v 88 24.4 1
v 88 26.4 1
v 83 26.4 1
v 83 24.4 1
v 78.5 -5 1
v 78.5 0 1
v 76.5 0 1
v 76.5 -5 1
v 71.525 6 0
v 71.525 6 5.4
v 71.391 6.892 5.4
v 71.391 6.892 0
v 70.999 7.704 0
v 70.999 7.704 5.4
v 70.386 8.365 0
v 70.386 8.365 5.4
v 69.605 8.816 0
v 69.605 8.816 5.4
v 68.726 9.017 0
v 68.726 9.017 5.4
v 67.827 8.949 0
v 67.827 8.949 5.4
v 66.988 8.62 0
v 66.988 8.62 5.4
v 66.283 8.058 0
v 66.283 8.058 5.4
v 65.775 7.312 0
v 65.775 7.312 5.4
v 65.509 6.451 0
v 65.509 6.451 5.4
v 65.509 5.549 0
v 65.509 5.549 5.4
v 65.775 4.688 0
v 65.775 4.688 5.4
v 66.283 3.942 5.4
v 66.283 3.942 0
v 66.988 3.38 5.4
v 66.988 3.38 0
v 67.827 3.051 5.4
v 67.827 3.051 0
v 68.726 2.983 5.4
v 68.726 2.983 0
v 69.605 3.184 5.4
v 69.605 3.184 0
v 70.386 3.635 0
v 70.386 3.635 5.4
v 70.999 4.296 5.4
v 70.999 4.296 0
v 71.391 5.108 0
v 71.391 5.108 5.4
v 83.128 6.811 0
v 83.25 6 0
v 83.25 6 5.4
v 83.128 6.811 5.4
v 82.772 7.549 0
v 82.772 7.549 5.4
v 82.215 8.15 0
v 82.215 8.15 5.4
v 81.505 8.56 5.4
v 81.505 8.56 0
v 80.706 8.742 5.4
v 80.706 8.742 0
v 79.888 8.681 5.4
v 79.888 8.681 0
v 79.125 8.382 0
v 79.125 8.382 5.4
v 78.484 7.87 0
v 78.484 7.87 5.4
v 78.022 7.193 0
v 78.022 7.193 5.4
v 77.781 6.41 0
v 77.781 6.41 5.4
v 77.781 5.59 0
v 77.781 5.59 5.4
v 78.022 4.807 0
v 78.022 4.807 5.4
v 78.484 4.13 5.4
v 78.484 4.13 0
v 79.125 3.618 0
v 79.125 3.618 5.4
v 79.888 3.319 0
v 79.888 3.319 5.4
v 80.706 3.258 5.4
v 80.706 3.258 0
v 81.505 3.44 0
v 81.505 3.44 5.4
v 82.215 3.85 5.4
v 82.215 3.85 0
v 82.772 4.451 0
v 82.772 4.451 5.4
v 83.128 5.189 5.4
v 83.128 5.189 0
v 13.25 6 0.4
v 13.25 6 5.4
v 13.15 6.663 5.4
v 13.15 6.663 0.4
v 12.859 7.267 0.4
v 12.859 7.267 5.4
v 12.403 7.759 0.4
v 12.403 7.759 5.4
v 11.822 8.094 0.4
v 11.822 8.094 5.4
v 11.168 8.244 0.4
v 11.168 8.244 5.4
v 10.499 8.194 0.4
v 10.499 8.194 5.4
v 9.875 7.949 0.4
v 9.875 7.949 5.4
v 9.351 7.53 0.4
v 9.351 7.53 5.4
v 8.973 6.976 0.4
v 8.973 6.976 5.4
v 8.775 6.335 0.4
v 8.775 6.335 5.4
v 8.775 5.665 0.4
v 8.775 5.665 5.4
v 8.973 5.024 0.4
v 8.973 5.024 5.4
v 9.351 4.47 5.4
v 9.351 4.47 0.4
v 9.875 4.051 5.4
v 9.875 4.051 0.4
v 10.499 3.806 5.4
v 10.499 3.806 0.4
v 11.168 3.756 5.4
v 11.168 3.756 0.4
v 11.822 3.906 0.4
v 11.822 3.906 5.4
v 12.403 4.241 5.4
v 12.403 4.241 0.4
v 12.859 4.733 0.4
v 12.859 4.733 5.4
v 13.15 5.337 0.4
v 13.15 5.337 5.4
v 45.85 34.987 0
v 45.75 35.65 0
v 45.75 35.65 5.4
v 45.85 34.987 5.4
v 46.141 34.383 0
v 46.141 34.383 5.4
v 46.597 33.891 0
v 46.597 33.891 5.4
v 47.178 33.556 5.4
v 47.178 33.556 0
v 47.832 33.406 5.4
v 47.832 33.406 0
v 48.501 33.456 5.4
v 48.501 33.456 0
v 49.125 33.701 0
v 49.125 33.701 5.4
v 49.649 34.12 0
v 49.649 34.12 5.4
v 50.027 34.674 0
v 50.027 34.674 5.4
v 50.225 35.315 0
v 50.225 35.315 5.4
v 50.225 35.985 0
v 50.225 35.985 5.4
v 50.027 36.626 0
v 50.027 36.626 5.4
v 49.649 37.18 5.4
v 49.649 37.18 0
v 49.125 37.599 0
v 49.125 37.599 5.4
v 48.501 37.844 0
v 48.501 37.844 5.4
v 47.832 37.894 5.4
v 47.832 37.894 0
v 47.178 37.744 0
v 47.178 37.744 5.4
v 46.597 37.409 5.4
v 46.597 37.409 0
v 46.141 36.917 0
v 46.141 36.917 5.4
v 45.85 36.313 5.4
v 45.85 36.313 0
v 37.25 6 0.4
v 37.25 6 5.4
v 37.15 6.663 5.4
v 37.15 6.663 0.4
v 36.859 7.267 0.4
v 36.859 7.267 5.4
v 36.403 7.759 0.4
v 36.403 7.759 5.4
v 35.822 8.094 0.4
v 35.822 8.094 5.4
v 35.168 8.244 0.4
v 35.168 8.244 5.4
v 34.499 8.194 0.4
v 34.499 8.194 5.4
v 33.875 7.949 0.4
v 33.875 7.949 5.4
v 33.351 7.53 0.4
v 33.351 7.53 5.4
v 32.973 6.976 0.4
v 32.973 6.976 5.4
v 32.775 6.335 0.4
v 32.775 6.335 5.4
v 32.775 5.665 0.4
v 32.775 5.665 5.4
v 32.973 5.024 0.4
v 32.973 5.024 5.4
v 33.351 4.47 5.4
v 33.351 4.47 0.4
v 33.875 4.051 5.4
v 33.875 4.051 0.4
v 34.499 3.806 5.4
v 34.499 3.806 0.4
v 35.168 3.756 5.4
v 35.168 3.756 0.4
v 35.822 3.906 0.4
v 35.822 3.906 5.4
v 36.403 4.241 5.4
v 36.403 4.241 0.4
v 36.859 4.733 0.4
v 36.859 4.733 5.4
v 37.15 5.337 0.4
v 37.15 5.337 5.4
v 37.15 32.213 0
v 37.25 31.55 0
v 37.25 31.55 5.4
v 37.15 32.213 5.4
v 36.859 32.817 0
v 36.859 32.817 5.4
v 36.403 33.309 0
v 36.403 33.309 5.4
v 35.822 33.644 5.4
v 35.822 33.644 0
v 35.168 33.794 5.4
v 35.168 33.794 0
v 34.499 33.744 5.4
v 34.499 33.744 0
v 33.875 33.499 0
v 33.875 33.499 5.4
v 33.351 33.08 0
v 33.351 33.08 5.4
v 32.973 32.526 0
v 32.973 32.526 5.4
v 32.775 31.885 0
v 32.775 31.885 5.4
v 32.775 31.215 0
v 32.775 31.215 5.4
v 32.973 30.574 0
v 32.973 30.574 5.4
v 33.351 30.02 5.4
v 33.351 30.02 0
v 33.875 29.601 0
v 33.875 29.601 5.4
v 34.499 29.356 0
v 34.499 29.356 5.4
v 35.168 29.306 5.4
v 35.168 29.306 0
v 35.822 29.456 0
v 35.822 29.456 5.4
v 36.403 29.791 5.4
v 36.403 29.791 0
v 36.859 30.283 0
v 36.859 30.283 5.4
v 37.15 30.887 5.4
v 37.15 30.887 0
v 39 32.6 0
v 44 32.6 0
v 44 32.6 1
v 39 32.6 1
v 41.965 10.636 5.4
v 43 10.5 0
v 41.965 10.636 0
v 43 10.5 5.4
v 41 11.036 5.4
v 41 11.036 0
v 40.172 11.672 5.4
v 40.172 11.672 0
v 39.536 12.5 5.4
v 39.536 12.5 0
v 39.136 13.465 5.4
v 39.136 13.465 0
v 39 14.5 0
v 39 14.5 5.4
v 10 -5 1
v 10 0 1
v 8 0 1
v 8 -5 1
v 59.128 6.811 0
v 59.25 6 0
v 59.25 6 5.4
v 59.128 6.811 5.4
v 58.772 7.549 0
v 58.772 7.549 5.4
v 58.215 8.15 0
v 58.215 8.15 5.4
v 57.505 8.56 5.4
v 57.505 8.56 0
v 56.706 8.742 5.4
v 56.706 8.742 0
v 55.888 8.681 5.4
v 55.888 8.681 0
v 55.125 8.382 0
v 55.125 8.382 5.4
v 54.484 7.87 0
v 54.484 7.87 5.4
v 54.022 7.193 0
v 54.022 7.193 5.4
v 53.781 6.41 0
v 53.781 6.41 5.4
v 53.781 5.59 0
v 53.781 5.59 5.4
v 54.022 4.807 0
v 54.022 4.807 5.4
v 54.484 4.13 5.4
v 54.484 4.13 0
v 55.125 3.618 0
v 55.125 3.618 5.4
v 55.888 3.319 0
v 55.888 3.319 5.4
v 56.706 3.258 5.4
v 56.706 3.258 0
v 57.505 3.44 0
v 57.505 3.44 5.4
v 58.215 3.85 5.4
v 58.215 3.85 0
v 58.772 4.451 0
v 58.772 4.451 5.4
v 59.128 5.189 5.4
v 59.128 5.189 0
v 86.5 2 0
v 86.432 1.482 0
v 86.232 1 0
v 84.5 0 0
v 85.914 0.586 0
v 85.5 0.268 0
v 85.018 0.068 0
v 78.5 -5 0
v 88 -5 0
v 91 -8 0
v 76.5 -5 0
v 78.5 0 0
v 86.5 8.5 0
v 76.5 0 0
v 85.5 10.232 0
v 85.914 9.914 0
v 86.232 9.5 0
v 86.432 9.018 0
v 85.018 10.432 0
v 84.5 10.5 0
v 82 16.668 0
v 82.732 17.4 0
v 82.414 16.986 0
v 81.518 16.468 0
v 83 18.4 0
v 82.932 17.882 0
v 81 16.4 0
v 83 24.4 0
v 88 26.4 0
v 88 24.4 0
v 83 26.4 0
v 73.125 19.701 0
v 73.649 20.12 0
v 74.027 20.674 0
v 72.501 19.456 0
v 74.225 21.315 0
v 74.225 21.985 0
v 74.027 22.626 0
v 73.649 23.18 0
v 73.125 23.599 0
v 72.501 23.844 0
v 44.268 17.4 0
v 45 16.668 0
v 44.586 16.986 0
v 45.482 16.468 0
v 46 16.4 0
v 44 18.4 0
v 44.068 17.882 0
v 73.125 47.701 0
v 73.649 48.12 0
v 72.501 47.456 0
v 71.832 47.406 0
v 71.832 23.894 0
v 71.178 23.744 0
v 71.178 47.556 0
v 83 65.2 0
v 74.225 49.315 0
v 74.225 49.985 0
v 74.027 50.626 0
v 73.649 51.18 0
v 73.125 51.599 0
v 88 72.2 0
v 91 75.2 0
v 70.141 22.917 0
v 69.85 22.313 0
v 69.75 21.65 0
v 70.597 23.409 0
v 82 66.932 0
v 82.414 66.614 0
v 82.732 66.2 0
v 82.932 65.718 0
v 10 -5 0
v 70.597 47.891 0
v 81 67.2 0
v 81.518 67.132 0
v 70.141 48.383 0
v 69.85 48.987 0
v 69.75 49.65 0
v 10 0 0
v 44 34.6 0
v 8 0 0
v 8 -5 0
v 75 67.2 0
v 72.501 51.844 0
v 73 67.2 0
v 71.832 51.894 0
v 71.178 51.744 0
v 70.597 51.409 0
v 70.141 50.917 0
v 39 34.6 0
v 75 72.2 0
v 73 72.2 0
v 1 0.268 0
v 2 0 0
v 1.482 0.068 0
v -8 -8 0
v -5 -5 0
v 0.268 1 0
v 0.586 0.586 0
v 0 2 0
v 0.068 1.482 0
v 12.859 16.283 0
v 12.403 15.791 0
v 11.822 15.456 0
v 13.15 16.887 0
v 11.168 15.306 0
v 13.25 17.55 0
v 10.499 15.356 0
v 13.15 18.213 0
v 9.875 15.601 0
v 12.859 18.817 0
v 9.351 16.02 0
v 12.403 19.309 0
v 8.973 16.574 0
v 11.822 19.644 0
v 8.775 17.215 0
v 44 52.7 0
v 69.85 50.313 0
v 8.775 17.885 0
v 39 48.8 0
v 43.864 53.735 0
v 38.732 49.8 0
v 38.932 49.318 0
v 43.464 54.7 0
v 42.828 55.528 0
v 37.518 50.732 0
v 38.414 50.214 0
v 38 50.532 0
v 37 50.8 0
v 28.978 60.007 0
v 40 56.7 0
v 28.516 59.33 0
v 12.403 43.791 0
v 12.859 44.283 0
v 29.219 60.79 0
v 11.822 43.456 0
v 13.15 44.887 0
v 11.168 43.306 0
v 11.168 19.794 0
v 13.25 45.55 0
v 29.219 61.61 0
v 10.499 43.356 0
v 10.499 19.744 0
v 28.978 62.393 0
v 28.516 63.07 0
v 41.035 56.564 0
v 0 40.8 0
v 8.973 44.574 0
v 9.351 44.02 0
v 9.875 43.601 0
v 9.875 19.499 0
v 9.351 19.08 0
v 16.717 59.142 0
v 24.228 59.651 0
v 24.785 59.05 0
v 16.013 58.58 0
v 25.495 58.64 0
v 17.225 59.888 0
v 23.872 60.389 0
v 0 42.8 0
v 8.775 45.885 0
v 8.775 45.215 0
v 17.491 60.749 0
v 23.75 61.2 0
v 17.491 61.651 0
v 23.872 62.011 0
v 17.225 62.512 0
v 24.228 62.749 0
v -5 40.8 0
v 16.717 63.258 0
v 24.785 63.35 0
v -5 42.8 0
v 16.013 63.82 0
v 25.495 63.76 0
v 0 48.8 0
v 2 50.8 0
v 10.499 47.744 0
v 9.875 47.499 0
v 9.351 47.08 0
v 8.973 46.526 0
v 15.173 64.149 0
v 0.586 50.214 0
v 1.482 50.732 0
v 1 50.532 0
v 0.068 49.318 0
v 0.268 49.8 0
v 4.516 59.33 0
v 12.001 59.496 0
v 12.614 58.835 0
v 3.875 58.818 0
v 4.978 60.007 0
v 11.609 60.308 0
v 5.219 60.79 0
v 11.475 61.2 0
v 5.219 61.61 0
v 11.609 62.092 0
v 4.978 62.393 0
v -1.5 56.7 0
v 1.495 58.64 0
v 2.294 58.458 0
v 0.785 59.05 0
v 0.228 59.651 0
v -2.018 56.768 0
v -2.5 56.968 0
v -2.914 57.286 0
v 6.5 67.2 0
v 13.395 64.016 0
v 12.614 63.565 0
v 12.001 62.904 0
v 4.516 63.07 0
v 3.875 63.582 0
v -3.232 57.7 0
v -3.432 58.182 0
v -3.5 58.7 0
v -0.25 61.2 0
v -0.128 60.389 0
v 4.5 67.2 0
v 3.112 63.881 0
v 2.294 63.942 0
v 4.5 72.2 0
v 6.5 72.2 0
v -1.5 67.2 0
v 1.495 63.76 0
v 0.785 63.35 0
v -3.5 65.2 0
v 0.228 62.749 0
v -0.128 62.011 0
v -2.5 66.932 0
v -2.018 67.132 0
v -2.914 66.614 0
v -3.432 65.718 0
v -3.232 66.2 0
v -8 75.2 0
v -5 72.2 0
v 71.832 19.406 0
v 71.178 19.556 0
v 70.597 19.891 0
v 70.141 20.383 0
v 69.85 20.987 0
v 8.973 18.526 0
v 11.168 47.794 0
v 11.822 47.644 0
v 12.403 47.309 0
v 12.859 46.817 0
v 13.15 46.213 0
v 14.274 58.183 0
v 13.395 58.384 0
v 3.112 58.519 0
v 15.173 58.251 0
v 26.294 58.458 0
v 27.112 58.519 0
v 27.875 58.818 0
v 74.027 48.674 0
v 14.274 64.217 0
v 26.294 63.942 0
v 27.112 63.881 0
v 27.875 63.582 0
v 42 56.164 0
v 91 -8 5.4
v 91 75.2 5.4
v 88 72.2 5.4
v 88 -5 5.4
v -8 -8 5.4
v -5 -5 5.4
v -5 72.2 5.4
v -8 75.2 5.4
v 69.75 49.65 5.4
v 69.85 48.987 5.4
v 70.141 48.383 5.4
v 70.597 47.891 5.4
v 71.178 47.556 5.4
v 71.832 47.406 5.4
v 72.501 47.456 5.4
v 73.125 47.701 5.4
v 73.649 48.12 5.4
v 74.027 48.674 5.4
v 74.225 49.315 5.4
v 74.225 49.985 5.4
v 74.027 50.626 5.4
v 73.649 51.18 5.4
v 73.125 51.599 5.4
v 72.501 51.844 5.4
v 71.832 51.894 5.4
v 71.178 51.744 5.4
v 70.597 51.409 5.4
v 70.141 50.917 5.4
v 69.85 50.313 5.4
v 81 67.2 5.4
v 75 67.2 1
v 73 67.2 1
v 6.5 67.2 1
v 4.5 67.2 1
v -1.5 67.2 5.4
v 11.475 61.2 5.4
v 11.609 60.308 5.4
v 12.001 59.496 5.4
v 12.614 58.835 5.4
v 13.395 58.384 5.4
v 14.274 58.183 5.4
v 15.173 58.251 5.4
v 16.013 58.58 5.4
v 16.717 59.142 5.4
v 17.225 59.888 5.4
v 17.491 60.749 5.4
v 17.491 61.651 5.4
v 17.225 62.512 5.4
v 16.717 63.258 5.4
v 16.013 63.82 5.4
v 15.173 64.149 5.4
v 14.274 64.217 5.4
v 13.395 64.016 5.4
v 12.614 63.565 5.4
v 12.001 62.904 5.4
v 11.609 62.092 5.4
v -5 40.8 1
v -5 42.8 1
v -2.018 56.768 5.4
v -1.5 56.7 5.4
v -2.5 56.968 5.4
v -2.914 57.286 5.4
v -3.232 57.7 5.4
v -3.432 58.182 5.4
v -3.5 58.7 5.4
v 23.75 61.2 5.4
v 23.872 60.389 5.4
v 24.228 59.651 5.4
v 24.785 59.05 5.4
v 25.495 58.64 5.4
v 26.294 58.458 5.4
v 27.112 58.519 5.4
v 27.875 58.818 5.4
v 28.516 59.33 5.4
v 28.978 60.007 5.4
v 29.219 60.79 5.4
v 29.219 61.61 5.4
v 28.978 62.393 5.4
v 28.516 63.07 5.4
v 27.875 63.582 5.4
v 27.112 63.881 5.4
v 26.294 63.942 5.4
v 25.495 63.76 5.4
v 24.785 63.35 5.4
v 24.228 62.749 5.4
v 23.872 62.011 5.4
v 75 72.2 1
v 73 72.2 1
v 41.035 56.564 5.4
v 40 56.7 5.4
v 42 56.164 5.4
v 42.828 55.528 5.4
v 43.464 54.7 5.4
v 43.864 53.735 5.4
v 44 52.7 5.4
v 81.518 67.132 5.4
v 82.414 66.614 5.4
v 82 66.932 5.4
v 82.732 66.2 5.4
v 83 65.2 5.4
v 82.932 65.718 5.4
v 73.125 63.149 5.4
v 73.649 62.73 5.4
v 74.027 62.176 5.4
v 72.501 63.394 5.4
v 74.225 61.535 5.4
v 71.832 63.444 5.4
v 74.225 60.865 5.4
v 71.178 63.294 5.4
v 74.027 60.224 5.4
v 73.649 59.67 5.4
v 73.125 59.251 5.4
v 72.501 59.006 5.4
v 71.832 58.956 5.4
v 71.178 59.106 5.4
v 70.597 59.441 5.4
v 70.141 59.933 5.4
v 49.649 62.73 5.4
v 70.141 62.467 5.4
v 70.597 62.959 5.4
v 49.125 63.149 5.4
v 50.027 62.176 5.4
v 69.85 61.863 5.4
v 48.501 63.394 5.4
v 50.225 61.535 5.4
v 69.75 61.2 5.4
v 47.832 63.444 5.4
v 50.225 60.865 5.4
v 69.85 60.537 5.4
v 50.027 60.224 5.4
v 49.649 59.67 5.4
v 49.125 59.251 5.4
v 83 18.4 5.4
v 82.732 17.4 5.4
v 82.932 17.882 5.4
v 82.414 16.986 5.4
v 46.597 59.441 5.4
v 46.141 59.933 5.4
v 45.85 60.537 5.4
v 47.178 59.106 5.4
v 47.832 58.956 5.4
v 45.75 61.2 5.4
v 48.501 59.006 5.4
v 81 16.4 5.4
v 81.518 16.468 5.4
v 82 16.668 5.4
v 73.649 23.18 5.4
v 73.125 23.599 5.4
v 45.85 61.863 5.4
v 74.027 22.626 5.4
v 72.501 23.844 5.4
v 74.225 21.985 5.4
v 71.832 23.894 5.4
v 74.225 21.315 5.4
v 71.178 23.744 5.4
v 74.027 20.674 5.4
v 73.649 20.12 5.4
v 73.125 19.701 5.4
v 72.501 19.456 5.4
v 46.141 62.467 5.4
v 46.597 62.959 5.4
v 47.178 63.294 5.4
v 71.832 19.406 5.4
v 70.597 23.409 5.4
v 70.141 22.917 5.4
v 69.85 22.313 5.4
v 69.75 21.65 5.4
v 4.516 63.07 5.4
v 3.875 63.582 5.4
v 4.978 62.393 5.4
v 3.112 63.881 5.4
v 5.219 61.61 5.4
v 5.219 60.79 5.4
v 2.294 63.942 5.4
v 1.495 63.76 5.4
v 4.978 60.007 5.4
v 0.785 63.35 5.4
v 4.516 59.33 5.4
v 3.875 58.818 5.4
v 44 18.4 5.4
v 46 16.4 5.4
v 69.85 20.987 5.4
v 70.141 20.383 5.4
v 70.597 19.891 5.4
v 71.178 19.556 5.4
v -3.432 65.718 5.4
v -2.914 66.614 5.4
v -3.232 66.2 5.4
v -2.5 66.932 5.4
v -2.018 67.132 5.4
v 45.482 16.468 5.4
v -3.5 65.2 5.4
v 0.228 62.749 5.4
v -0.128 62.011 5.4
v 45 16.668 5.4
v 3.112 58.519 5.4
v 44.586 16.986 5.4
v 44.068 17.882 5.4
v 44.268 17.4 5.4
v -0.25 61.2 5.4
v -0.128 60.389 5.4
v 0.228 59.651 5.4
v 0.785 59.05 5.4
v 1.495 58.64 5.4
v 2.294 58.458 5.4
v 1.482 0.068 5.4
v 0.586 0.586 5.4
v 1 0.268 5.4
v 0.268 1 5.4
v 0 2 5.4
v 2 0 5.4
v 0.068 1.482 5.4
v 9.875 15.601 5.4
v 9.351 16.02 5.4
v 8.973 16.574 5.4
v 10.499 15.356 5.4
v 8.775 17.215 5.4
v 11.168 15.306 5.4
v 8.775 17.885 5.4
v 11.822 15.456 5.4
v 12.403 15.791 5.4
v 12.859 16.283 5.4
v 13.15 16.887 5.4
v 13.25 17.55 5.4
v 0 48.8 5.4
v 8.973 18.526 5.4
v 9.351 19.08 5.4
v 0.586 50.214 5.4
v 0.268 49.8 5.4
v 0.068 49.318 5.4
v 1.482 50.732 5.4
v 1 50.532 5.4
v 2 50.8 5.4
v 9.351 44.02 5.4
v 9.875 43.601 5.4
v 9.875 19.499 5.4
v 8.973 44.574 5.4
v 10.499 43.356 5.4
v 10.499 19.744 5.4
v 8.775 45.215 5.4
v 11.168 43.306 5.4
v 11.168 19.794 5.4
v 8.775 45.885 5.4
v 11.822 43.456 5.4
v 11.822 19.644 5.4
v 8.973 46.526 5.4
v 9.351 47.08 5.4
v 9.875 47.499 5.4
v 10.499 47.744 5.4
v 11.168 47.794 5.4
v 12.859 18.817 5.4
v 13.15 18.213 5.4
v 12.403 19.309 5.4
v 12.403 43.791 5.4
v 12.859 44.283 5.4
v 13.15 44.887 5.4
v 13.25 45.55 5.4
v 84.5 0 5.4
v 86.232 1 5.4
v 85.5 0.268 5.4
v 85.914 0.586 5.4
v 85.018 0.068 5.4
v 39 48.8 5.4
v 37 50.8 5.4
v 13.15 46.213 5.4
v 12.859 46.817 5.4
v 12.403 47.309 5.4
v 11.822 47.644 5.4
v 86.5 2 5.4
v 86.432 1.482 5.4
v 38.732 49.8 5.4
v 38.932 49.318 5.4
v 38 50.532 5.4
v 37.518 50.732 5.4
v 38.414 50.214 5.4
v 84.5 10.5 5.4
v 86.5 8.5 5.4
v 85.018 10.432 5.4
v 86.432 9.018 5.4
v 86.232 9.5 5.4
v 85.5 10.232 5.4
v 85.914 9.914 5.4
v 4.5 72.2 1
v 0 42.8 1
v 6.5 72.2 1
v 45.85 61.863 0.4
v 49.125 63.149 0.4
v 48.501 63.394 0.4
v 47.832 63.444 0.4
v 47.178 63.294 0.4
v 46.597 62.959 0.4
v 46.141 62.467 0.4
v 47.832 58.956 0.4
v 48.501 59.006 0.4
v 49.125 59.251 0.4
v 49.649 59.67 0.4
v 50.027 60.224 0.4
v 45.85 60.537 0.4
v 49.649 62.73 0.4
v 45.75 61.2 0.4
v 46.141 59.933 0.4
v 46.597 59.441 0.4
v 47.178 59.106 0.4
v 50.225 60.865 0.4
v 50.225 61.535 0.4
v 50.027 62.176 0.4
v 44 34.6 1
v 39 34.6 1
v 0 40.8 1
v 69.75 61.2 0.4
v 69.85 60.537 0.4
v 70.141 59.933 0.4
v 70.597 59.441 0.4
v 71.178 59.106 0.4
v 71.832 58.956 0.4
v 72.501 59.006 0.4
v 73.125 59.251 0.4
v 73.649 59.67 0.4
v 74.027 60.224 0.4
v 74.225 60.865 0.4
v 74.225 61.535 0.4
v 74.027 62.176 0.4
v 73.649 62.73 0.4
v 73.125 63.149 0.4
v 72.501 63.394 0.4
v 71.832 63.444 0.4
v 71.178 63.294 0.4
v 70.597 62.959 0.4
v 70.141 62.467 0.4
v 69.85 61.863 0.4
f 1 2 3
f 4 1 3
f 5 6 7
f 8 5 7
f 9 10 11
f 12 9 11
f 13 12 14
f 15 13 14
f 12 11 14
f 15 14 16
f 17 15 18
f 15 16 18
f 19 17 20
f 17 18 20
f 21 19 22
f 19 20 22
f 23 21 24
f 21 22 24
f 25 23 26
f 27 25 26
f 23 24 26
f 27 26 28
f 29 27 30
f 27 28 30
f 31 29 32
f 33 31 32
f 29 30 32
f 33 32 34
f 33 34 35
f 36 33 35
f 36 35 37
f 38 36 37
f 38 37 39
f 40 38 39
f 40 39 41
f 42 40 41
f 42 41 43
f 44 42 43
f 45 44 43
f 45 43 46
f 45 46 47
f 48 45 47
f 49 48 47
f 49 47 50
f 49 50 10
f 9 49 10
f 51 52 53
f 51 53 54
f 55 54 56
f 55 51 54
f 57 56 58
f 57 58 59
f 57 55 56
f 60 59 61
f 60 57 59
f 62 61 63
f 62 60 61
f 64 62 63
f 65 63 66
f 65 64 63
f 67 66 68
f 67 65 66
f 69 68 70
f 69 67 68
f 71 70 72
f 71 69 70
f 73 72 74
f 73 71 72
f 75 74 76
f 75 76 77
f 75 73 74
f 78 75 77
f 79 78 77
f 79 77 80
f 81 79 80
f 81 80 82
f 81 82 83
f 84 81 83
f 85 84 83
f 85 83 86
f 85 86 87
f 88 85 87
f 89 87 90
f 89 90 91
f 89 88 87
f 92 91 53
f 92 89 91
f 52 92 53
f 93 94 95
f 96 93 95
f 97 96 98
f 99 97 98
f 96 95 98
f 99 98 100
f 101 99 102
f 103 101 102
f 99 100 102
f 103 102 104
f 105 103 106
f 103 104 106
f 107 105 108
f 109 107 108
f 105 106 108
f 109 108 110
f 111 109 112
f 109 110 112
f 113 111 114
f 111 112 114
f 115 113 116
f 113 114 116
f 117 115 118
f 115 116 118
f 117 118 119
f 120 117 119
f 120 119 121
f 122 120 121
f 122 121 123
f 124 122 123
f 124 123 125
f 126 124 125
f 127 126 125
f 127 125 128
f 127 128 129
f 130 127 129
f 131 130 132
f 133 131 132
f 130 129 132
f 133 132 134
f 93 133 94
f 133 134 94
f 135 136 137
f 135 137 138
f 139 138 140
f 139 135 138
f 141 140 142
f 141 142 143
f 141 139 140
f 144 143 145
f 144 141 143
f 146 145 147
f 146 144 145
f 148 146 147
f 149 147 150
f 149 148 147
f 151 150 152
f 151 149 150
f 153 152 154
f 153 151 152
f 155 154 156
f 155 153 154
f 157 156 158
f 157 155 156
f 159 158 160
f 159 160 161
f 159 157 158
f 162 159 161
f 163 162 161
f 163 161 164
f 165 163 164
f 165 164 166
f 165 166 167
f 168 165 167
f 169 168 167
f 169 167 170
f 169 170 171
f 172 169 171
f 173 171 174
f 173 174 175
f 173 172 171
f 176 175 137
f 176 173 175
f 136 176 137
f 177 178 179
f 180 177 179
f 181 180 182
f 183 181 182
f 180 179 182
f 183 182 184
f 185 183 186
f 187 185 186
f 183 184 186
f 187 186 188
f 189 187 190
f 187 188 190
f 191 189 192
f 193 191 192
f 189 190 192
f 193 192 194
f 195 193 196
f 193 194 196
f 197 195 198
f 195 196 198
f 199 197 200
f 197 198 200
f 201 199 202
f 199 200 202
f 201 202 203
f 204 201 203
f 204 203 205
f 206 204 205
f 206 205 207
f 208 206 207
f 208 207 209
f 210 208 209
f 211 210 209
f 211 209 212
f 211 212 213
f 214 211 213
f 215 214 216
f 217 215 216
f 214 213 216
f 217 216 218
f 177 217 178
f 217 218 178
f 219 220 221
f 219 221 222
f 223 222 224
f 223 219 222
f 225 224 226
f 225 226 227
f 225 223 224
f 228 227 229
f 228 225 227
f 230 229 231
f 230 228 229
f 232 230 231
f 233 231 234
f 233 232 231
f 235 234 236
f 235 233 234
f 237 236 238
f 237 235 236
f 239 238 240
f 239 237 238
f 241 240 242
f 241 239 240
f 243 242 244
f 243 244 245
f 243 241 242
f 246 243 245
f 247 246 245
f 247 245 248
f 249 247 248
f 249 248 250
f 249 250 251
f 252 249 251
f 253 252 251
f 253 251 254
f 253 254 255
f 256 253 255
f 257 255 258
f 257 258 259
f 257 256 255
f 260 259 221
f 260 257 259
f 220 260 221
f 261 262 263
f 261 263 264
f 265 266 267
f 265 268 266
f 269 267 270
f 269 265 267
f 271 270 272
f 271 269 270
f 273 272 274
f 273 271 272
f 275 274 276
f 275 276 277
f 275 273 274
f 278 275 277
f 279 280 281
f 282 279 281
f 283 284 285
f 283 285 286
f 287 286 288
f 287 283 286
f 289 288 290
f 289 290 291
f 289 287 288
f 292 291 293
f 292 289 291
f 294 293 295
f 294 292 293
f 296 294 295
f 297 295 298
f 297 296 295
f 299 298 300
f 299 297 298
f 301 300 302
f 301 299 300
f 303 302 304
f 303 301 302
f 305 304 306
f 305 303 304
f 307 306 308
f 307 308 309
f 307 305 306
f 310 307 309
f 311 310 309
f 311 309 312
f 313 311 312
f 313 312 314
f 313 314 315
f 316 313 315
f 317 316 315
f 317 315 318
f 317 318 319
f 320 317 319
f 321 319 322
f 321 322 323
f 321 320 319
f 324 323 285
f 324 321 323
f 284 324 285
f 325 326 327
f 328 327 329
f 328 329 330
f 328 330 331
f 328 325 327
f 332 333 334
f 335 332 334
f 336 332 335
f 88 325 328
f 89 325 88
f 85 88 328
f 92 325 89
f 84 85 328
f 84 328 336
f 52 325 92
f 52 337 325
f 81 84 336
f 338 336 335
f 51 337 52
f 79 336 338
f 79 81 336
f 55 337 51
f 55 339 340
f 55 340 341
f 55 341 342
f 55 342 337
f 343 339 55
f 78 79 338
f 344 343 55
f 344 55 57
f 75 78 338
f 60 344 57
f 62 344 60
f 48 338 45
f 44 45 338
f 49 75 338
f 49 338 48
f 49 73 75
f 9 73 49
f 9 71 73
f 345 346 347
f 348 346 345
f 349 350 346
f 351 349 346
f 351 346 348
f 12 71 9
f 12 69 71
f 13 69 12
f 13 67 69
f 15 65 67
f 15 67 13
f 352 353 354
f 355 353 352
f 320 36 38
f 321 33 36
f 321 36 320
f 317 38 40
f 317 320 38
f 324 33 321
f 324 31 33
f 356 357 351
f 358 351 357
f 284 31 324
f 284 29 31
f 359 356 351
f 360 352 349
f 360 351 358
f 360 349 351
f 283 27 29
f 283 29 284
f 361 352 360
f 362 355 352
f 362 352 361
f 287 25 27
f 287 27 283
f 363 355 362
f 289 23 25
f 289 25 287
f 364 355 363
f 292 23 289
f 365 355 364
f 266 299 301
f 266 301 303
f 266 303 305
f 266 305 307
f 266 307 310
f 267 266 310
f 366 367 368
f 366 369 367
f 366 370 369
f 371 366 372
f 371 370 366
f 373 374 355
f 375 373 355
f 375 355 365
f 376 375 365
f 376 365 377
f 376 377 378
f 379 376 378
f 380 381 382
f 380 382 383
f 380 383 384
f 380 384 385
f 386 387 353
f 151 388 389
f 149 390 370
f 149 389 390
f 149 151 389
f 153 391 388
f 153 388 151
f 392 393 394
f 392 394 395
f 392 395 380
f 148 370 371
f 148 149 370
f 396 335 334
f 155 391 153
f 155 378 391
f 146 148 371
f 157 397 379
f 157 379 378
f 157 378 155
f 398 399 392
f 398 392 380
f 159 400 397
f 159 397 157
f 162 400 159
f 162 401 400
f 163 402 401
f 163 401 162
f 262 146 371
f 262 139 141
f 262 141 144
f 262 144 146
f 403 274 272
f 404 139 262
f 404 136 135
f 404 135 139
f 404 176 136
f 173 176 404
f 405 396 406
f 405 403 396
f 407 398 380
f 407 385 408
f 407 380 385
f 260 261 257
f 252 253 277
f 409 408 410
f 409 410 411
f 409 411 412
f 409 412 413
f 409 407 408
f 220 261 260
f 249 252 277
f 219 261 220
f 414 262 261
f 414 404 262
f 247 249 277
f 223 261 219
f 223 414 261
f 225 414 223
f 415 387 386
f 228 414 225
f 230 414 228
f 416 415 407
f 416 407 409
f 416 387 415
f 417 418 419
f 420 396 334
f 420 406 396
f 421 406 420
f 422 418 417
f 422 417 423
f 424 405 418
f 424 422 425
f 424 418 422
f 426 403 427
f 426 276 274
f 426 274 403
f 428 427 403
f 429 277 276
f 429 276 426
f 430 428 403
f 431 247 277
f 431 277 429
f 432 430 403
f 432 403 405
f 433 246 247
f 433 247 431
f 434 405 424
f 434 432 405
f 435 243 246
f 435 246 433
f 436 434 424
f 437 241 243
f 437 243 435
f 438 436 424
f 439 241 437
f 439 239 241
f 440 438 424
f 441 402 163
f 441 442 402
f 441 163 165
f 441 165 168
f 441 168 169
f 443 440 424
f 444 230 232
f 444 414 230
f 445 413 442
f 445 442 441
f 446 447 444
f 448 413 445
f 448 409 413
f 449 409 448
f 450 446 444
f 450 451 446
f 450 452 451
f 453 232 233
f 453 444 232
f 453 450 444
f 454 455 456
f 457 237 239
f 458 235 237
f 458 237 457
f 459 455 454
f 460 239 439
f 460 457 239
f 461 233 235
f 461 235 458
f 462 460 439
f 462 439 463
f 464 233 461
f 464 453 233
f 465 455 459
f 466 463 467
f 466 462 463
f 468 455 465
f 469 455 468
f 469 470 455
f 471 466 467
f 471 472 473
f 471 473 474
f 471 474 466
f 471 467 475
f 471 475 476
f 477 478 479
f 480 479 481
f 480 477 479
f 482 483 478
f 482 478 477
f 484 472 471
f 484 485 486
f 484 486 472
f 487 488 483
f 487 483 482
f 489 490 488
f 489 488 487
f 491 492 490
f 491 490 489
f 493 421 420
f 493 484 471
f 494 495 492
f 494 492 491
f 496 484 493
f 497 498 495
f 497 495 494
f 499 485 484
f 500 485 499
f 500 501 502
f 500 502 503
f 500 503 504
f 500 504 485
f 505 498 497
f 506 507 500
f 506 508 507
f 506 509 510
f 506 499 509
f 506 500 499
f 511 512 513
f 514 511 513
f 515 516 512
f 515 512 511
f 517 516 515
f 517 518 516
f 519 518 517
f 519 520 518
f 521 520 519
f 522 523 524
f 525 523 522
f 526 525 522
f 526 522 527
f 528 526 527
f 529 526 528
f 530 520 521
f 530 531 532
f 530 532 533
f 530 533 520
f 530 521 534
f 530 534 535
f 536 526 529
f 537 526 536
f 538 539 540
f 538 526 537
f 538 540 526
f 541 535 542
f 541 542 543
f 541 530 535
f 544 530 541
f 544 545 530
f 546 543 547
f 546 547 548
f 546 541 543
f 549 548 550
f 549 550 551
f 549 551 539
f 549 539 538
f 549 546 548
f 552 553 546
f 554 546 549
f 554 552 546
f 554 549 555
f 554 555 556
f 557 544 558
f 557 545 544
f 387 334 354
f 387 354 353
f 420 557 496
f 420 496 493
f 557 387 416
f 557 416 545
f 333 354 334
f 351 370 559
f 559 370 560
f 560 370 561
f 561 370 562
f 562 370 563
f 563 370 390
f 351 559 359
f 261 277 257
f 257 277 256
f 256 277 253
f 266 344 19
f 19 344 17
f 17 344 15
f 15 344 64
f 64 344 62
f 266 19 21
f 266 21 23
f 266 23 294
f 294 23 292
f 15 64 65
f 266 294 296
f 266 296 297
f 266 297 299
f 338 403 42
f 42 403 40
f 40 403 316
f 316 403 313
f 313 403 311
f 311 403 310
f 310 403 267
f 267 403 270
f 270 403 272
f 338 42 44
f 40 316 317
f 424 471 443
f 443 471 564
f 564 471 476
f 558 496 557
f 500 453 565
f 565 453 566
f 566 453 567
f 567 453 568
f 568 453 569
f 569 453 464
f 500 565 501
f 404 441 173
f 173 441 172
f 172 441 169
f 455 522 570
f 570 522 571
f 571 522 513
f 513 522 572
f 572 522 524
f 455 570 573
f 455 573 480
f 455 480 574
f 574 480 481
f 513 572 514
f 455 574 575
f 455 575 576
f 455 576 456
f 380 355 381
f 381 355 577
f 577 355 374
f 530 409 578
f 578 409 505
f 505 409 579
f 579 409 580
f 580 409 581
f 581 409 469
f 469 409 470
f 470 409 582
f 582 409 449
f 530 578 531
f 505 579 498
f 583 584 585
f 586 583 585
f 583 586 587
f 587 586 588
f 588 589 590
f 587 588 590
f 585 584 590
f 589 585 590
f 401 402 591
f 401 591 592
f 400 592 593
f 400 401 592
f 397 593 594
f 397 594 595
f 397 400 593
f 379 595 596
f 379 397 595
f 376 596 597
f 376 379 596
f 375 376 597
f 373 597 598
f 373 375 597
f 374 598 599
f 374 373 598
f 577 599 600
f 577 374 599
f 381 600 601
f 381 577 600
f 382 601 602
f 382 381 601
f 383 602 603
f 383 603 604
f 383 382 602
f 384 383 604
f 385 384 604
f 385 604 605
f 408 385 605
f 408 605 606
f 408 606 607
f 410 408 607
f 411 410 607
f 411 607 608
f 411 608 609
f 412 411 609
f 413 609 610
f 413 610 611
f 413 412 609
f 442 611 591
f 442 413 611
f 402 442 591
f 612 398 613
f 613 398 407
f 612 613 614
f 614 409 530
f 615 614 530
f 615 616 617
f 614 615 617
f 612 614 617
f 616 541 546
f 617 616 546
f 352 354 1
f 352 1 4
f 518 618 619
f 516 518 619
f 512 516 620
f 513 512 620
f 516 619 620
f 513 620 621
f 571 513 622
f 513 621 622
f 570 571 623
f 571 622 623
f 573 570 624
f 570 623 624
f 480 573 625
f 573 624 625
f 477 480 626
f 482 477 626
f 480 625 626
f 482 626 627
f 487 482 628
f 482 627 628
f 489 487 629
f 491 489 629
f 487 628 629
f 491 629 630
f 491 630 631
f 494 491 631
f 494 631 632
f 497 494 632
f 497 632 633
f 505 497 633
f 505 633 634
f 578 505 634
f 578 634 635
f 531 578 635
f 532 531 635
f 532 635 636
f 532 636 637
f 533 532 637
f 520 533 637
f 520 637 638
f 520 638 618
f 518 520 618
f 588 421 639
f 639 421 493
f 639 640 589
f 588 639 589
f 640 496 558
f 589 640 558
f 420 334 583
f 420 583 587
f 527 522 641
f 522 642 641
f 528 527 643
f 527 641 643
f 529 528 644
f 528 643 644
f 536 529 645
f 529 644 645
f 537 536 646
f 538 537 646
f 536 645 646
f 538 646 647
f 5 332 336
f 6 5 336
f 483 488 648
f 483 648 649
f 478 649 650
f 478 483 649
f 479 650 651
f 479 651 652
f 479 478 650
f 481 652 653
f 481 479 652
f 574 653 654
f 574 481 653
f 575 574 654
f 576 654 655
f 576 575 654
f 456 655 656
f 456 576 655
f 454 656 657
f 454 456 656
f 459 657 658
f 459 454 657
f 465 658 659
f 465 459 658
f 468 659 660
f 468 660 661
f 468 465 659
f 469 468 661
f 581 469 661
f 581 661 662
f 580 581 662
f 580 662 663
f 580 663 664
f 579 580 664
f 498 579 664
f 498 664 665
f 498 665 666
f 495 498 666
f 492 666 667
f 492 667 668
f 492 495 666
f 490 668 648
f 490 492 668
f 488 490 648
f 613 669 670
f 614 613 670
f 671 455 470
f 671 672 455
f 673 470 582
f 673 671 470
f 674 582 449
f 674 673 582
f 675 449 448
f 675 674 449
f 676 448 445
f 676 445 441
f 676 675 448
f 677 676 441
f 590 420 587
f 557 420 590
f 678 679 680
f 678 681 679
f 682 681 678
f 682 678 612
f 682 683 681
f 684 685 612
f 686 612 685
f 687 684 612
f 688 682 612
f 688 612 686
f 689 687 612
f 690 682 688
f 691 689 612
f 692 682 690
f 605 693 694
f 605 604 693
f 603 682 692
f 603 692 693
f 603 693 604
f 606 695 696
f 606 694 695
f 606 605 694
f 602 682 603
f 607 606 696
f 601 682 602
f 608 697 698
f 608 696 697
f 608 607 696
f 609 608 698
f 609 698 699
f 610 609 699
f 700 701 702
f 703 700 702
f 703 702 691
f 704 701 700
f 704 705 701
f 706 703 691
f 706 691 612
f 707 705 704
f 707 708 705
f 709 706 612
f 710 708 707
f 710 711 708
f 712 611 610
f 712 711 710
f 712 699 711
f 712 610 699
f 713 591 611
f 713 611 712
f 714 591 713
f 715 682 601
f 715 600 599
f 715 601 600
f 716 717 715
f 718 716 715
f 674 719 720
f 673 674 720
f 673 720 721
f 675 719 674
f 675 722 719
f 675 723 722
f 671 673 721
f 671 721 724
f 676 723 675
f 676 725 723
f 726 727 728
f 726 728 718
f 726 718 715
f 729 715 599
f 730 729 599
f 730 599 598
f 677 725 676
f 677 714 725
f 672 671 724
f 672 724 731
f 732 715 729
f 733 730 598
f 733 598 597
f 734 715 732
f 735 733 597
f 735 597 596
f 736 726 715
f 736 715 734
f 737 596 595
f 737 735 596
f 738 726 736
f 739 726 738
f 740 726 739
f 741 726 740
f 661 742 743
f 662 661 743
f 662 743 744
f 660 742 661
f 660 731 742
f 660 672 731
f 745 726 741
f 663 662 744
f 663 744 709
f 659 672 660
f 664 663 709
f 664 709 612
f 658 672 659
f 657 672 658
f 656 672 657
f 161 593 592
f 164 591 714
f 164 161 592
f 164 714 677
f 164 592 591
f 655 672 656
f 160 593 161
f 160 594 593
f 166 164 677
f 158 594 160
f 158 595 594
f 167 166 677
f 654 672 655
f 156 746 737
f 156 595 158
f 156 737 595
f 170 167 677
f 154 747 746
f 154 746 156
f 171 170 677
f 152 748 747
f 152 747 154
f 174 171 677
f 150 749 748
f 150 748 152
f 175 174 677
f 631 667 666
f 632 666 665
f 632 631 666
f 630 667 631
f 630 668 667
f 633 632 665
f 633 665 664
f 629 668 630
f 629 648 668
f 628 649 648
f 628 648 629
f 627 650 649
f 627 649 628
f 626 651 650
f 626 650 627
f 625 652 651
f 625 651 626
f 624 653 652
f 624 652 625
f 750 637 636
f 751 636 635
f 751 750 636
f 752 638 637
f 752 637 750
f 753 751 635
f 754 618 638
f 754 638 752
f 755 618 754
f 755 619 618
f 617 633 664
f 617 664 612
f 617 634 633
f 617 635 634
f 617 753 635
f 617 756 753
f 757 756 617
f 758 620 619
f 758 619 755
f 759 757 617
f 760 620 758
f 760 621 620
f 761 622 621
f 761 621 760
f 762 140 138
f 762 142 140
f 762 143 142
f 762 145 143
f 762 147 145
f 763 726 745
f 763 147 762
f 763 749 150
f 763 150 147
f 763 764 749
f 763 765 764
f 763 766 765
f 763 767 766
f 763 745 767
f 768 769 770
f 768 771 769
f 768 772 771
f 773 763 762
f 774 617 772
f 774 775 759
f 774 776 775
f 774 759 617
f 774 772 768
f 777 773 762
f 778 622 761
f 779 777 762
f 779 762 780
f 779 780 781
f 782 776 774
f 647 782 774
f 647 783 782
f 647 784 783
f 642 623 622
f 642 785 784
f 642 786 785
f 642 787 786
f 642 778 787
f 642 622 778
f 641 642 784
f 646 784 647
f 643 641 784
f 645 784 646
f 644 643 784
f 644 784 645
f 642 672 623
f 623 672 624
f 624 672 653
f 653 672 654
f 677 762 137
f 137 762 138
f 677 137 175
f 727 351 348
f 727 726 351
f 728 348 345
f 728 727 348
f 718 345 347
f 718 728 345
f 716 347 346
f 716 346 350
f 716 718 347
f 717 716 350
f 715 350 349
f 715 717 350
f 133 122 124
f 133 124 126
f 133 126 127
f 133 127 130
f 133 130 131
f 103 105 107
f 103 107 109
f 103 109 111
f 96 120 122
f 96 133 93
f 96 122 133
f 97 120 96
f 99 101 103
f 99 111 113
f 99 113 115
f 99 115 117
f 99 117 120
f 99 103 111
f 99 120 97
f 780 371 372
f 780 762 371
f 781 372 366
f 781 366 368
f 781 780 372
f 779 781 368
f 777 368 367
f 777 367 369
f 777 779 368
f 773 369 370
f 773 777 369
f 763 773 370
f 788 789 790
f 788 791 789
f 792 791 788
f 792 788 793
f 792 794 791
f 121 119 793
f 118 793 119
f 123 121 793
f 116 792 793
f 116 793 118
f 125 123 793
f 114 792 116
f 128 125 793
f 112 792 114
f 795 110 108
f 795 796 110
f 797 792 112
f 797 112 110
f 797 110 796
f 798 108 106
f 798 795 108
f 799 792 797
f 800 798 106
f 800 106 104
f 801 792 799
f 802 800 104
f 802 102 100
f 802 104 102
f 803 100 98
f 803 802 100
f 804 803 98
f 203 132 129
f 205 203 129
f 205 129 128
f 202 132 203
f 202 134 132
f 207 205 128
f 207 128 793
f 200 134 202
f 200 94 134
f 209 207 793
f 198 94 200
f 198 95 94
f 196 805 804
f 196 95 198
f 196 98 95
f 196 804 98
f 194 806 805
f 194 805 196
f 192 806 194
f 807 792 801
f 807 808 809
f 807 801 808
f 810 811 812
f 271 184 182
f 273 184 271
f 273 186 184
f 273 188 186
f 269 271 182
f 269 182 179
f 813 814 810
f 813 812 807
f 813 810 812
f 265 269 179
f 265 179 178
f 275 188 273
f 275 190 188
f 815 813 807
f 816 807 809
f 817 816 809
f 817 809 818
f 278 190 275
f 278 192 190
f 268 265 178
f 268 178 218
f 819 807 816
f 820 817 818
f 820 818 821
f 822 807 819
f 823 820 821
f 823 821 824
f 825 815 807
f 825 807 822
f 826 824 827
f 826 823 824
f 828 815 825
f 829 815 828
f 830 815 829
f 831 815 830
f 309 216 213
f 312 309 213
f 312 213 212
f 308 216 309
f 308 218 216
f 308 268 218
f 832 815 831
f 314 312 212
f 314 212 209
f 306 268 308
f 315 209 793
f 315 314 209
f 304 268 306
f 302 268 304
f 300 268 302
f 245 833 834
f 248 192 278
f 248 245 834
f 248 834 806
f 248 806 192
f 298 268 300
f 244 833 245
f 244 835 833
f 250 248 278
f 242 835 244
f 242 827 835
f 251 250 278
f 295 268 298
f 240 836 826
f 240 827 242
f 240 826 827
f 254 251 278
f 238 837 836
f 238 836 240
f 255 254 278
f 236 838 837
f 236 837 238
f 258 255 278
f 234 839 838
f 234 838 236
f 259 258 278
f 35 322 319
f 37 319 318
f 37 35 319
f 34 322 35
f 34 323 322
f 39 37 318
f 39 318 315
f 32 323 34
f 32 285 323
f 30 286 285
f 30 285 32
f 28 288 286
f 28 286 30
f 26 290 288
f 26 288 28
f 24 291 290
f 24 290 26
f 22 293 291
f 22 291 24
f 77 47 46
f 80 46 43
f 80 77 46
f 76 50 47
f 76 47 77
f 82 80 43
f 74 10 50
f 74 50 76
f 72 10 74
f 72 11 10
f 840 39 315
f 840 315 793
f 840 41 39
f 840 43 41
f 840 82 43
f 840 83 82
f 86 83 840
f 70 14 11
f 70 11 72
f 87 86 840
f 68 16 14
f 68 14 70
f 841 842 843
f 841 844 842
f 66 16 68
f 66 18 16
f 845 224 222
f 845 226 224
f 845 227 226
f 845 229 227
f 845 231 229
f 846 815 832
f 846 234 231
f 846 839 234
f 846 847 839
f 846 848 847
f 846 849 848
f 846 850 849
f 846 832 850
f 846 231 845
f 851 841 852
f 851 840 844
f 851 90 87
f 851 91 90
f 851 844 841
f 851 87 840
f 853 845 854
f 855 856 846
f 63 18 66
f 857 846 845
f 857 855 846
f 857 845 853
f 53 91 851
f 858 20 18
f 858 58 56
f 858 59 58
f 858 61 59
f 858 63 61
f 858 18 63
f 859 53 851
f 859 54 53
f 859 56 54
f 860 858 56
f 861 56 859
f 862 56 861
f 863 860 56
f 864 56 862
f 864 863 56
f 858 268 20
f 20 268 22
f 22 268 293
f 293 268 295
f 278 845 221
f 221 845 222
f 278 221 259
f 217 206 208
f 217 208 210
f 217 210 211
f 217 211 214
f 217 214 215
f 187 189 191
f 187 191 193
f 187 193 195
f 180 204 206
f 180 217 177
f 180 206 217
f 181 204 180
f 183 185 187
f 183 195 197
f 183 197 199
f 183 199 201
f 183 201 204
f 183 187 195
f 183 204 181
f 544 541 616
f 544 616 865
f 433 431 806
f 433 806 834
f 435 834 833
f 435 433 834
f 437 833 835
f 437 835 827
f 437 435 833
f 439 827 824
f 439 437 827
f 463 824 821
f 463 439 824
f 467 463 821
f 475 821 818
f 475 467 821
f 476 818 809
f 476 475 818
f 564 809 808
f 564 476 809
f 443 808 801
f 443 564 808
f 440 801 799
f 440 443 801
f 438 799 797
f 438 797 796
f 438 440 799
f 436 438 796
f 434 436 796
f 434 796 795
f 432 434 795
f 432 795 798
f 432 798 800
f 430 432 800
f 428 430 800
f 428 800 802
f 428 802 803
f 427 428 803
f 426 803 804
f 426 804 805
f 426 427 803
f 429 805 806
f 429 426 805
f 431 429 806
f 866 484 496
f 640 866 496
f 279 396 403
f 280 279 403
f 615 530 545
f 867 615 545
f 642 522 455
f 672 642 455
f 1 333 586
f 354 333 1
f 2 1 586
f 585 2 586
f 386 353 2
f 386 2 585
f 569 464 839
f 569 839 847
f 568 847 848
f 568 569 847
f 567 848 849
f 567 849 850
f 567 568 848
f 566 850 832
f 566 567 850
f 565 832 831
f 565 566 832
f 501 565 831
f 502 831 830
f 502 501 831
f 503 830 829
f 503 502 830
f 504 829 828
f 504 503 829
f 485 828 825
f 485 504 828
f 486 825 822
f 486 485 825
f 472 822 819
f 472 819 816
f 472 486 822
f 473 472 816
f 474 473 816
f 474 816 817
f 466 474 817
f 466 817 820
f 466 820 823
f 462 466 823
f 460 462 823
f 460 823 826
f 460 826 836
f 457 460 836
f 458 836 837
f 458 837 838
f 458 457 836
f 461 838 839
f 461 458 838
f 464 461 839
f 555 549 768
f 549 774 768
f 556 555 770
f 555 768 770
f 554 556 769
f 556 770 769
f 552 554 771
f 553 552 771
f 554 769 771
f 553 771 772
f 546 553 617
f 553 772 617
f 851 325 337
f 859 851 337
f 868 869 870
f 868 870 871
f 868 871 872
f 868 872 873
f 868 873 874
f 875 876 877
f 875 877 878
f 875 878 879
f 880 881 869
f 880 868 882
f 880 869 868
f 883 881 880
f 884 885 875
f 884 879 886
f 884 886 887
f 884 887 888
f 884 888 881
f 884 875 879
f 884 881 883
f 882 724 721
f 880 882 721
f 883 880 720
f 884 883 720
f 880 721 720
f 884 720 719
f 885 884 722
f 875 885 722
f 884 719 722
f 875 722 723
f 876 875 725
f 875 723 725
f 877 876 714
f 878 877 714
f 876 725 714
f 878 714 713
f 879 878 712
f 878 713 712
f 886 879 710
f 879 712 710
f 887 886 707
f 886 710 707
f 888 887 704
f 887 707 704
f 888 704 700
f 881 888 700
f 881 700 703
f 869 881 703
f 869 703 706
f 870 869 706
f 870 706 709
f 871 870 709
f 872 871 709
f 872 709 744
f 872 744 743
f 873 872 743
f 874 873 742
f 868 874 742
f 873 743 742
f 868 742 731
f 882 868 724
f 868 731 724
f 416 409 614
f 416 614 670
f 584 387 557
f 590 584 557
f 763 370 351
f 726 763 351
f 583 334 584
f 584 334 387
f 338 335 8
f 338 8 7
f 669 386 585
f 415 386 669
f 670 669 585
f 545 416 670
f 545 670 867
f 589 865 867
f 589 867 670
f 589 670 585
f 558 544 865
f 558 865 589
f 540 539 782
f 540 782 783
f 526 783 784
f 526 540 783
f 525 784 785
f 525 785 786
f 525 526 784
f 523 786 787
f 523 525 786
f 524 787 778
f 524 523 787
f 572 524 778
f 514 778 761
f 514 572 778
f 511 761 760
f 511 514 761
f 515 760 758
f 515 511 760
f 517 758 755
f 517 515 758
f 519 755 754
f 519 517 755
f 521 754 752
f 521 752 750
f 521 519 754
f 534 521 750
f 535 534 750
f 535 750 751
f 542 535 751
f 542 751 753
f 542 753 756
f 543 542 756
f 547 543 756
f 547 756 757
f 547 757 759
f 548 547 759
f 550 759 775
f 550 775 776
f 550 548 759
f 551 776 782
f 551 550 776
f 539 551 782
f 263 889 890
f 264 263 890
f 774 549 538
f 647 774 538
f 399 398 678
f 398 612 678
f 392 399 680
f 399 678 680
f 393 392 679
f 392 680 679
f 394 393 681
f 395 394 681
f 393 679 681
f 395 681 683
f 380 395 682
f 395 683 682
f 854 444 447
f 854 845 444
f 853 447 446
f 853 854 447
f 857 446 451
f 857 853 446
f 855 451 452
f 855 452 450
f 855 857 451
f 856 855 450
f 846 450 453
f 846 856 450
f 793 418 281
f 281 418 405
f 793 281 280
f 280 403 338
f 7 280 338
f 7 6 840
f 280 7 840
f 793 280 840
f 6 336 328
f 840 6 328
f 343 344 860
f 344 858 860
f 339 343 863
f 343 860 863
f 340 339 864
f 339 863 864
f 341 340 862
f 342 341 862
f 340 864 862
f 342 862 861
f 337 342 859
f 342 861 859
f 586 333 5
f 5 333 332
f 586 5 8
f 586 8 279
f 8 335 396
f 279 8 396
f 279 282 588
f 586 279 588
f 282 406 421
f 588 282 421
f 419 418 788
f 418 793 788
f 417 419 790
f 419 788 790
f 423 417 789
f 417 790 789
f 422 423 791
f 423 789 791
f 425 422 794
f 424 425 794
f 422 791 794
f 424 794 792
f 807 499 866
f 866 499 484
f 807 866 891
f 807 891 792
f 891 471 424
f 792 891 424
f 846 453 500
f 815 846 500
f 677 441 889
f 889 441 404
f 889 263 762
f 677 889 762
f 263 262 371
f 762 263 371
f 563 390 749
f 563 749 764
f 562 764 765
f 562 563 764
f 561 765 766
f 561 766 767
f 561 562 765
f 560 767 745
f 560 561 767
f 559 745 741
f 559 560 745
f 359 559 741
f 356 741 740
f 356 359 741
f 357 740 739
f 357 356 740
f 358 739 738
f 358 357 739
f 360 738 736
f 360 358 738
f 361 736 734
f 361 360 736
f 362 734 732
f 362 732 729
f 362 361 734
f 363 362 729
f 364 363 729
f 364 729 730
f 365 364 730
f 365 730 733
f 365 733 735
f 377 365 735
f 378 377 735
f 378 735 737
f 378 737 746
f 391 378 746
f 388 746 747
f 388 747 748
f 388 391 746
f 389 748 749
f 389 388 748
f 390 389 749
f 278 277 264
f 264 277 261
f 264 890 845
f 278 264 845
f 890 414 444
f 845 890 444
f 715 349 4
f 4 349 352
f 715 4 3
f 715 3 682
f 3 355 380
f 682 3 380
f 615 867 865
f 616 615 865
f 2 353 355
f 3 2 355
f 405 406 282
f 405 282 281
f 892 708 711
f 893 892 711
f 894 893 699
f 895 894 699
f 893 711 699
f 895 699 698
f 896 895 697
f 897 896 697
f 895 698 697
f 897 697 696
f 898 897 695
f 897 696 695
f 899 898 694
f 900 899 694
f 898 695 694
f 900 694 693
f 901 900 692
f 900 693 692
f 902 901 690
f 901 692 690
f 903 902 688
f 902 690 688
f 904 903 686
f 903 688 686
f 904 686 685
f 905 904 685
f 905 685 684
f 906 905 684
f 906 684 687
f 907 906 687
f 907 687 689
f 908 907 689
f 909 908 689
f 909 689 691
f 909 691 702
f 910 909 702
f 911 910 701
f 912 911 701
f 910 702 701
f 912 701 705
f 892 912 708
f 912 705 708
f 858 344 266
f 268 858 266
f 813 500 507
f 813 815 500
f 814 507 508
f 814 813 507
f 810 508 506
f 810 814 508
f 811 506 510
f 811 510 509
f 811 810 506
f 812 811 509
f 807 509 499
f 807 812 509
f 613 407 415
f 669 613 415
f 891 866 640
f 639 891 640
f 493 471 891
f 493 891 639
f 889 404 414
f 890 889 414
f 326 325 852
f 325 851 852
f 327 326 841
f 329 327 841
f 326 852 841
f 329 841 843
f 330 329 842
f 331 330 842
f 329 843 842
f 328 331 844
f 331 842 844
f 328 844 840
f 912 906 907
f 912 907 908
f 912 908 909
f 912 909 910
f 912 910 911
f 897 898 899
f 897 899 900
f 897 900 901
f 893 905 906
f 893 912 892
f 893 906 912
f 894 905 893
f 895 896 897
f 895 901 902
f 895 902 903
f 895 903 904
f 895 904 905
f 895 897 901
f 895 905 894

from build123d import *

# Parameters (mm, degrees)
SKETCH1_R           = 2.75
SKETCH1_R_2         = 2.25
BOSS_EXTRUDE1_DEPTH = 5.4
FILLET1_R           = 4
SKETCH2_R           = 3.025
CUT_EXTRUDE1_DEPTH  = 6.4
SKETCH3_R           = 2.25
CUT_EXTRUDE2_DEPTH  = 5
CIRPATTERN1_COUNT   = 2
FILLET2_R           = 2
FILLET3_R           = 2
SKETCH5_W           = 99
SKETCH5_H           = 83.2
SKETCH5_W_2         = 93
SKETCH5_H_2         = 77.2
BOSS_EXTRUDE3_DEPTH = 5.4
SKETCH6_W           = 5
SKETCH6_H           = 2
SKETCH6_W_2         = 2
SKETCH6_H_2         = 5
BOSS_EXTRUDE4_DEPTH = 1


with BuildPart() as part:
    # Sketch1 → Boss-Extrude1 (new body)
    with BuildSketch(Plane.XY):
        Polygon((0, 0), (86.5, 0), (86.5, 10.5), (39, 10.5), (39, 50.8), (0, 50.8), align=None)
        with Locations((56.5, 6)):
            Circle(SKETCH1_R, mode=Mode.SUBTRACT)
        with Locations((11, 17.55)):
            Circle(SKETCH1_R_2, mode=Mode.SUBTRACT)
        with Locations((80.5, 6)):
            Circle(SKETCH1_R, mode=Mode.SUBTRACT)
        with Locations((11, 45.55)):
            Circle(SKETCH1_R_2, mode=Mode.SUBTRACT)
        with Locations((35, 31.55)):
            Circle(SKETCH1_R_2, mode=Mode.SUBTRACT)
    extrude(amount=BOSS_EXTRUDE1_DEPTH)

    # Fillet1
    fillet1_edges = [part.edges().sort_by_distance(p)[0] for p in [
        (39, 10.5, 2.7),
    ]]
    fillet(fillet1_edges, radius=FILLET1_R)

    # Sketch2 → Cut-Extrude1 (cut, through all)
    with BuildSketch(Plane.XY.offset(5.4)):
        with Locations((68.5, 6)):
            Circle(SKETCH2_R)
    extrude(amount=-CUT_EXTRUDE1_DEPTH, mode=Mode.SUBTRACT)

    # Sketch3 → Cut-Extrude2 (cut)
    with BuildSketch(Plane.XY.offset(5.4)):
        with Locations((11, 6)):
            Circle(SKETCH3_R)
        with Locations((35, 6)):
            Circle(SKETCH3_R)
    extrude(amount=-CUT_EXTRUDE2_DEPTH, mode=Mode.SUBTRACT)


with BuildPart() as cirpattern1_1:
    # CirPattern1: pattern copy
    add(part.part.rotate(Axis((41.5, 33.6, 0), (0, 0, 1)), 1 * 360 / CIRPATTERN1_COUNT))

    # Fillet2
    fillet2_edges = [cirpattern1_1.edges().sort_by_distance(p)[0] for p in [
        (83, 16.4, 2.7),
        (44, 16.4, 2.7),
        (-3.5, 56.7, 2.7),
        (-3.5, 67.2, 2.7),
        (83, 67.2, 2.7),
    ]]
    fillet(fillet2_edges, radius=FILLET2_R)


with BuildPart() as part_1:
    add(part.part)

    # Fillet3
    fillet3_edges = [part_1.edges().sort_by_distance(p)[0] for p in [
        (0, 50.8, 2.7),
        (39, 50.8, 2.7),
        (86.5, 10.5, 2.7),
        (86.5, 0, 2.7),
        (0, 0, 2.7),
    ]]
    fillet(fillet3_edges, radius=FILLET3_R)

    add(cirpattern1_1.part)  # Boss-Extrude4 merges CirPattern1_1


with BuildPart() as body_3:
    # Sketch5 → Boss-Extrude3 (new body)
    with BuildSketch(Plane(origin=(0, 0, 0), x_dir=(-1, 0, 0), z_dir=(0, 0, -1))):
        with Locations((-41.5, 33.6)):
            Rectangle(SKETCH5_W, SKETCH5_H)
        with Locations((-41.5, 33.6)):
            Rectangle(SKETCH5_W_2, SKETCH5_H_2, mode=Mode.SUBTRACT)
    extrude(amount=-BOSS_EXTRUDE3_DEPTH)


with BuildPart() as part_2:
    add(part_1.part)

    add(body_3.part)  # Boss-Extrude4 merges body 3
    # Sketch6 → Boss-Extrude4 (add)
    with BuildSketch(Plane(origin=(0, 0, 0), x_dir=(-1, 0, 0), z_dir=(0, 0, -1))):
        with Locations((-41.5, 33.6)):
            Rectangle(SKETCH6_W, SKETCH6_H)
        with Locations((2.5, 41.8)):
            Rectangle(SKETCH6_W, SKETCH6_H)
        with Locations((-9, -2.5)):
            Rectangle(SKETCH6_W_2, SKETCH6_H_2)
        with Locations((-77.5, -2.5)):
            Rectangle(SKETCH6_W_2, SKETCH6_H_2)
        with Locations((-85.5, 25.4)):
            Rectangle(SKETCH6_W, SKETCH6_H)
        with Locations((-74, 69.7)):
            Rectangle(SKETCH6_W_2, SKETCH6_H_2)
        with Locations((-5.5, 69.7)):
            Rectangle(SKETCH6_W_2, SKETCH6_H_2)
    extrude(amount=-BOSS_EXTRUDE4_DEPTH)


solid = part_2.part
